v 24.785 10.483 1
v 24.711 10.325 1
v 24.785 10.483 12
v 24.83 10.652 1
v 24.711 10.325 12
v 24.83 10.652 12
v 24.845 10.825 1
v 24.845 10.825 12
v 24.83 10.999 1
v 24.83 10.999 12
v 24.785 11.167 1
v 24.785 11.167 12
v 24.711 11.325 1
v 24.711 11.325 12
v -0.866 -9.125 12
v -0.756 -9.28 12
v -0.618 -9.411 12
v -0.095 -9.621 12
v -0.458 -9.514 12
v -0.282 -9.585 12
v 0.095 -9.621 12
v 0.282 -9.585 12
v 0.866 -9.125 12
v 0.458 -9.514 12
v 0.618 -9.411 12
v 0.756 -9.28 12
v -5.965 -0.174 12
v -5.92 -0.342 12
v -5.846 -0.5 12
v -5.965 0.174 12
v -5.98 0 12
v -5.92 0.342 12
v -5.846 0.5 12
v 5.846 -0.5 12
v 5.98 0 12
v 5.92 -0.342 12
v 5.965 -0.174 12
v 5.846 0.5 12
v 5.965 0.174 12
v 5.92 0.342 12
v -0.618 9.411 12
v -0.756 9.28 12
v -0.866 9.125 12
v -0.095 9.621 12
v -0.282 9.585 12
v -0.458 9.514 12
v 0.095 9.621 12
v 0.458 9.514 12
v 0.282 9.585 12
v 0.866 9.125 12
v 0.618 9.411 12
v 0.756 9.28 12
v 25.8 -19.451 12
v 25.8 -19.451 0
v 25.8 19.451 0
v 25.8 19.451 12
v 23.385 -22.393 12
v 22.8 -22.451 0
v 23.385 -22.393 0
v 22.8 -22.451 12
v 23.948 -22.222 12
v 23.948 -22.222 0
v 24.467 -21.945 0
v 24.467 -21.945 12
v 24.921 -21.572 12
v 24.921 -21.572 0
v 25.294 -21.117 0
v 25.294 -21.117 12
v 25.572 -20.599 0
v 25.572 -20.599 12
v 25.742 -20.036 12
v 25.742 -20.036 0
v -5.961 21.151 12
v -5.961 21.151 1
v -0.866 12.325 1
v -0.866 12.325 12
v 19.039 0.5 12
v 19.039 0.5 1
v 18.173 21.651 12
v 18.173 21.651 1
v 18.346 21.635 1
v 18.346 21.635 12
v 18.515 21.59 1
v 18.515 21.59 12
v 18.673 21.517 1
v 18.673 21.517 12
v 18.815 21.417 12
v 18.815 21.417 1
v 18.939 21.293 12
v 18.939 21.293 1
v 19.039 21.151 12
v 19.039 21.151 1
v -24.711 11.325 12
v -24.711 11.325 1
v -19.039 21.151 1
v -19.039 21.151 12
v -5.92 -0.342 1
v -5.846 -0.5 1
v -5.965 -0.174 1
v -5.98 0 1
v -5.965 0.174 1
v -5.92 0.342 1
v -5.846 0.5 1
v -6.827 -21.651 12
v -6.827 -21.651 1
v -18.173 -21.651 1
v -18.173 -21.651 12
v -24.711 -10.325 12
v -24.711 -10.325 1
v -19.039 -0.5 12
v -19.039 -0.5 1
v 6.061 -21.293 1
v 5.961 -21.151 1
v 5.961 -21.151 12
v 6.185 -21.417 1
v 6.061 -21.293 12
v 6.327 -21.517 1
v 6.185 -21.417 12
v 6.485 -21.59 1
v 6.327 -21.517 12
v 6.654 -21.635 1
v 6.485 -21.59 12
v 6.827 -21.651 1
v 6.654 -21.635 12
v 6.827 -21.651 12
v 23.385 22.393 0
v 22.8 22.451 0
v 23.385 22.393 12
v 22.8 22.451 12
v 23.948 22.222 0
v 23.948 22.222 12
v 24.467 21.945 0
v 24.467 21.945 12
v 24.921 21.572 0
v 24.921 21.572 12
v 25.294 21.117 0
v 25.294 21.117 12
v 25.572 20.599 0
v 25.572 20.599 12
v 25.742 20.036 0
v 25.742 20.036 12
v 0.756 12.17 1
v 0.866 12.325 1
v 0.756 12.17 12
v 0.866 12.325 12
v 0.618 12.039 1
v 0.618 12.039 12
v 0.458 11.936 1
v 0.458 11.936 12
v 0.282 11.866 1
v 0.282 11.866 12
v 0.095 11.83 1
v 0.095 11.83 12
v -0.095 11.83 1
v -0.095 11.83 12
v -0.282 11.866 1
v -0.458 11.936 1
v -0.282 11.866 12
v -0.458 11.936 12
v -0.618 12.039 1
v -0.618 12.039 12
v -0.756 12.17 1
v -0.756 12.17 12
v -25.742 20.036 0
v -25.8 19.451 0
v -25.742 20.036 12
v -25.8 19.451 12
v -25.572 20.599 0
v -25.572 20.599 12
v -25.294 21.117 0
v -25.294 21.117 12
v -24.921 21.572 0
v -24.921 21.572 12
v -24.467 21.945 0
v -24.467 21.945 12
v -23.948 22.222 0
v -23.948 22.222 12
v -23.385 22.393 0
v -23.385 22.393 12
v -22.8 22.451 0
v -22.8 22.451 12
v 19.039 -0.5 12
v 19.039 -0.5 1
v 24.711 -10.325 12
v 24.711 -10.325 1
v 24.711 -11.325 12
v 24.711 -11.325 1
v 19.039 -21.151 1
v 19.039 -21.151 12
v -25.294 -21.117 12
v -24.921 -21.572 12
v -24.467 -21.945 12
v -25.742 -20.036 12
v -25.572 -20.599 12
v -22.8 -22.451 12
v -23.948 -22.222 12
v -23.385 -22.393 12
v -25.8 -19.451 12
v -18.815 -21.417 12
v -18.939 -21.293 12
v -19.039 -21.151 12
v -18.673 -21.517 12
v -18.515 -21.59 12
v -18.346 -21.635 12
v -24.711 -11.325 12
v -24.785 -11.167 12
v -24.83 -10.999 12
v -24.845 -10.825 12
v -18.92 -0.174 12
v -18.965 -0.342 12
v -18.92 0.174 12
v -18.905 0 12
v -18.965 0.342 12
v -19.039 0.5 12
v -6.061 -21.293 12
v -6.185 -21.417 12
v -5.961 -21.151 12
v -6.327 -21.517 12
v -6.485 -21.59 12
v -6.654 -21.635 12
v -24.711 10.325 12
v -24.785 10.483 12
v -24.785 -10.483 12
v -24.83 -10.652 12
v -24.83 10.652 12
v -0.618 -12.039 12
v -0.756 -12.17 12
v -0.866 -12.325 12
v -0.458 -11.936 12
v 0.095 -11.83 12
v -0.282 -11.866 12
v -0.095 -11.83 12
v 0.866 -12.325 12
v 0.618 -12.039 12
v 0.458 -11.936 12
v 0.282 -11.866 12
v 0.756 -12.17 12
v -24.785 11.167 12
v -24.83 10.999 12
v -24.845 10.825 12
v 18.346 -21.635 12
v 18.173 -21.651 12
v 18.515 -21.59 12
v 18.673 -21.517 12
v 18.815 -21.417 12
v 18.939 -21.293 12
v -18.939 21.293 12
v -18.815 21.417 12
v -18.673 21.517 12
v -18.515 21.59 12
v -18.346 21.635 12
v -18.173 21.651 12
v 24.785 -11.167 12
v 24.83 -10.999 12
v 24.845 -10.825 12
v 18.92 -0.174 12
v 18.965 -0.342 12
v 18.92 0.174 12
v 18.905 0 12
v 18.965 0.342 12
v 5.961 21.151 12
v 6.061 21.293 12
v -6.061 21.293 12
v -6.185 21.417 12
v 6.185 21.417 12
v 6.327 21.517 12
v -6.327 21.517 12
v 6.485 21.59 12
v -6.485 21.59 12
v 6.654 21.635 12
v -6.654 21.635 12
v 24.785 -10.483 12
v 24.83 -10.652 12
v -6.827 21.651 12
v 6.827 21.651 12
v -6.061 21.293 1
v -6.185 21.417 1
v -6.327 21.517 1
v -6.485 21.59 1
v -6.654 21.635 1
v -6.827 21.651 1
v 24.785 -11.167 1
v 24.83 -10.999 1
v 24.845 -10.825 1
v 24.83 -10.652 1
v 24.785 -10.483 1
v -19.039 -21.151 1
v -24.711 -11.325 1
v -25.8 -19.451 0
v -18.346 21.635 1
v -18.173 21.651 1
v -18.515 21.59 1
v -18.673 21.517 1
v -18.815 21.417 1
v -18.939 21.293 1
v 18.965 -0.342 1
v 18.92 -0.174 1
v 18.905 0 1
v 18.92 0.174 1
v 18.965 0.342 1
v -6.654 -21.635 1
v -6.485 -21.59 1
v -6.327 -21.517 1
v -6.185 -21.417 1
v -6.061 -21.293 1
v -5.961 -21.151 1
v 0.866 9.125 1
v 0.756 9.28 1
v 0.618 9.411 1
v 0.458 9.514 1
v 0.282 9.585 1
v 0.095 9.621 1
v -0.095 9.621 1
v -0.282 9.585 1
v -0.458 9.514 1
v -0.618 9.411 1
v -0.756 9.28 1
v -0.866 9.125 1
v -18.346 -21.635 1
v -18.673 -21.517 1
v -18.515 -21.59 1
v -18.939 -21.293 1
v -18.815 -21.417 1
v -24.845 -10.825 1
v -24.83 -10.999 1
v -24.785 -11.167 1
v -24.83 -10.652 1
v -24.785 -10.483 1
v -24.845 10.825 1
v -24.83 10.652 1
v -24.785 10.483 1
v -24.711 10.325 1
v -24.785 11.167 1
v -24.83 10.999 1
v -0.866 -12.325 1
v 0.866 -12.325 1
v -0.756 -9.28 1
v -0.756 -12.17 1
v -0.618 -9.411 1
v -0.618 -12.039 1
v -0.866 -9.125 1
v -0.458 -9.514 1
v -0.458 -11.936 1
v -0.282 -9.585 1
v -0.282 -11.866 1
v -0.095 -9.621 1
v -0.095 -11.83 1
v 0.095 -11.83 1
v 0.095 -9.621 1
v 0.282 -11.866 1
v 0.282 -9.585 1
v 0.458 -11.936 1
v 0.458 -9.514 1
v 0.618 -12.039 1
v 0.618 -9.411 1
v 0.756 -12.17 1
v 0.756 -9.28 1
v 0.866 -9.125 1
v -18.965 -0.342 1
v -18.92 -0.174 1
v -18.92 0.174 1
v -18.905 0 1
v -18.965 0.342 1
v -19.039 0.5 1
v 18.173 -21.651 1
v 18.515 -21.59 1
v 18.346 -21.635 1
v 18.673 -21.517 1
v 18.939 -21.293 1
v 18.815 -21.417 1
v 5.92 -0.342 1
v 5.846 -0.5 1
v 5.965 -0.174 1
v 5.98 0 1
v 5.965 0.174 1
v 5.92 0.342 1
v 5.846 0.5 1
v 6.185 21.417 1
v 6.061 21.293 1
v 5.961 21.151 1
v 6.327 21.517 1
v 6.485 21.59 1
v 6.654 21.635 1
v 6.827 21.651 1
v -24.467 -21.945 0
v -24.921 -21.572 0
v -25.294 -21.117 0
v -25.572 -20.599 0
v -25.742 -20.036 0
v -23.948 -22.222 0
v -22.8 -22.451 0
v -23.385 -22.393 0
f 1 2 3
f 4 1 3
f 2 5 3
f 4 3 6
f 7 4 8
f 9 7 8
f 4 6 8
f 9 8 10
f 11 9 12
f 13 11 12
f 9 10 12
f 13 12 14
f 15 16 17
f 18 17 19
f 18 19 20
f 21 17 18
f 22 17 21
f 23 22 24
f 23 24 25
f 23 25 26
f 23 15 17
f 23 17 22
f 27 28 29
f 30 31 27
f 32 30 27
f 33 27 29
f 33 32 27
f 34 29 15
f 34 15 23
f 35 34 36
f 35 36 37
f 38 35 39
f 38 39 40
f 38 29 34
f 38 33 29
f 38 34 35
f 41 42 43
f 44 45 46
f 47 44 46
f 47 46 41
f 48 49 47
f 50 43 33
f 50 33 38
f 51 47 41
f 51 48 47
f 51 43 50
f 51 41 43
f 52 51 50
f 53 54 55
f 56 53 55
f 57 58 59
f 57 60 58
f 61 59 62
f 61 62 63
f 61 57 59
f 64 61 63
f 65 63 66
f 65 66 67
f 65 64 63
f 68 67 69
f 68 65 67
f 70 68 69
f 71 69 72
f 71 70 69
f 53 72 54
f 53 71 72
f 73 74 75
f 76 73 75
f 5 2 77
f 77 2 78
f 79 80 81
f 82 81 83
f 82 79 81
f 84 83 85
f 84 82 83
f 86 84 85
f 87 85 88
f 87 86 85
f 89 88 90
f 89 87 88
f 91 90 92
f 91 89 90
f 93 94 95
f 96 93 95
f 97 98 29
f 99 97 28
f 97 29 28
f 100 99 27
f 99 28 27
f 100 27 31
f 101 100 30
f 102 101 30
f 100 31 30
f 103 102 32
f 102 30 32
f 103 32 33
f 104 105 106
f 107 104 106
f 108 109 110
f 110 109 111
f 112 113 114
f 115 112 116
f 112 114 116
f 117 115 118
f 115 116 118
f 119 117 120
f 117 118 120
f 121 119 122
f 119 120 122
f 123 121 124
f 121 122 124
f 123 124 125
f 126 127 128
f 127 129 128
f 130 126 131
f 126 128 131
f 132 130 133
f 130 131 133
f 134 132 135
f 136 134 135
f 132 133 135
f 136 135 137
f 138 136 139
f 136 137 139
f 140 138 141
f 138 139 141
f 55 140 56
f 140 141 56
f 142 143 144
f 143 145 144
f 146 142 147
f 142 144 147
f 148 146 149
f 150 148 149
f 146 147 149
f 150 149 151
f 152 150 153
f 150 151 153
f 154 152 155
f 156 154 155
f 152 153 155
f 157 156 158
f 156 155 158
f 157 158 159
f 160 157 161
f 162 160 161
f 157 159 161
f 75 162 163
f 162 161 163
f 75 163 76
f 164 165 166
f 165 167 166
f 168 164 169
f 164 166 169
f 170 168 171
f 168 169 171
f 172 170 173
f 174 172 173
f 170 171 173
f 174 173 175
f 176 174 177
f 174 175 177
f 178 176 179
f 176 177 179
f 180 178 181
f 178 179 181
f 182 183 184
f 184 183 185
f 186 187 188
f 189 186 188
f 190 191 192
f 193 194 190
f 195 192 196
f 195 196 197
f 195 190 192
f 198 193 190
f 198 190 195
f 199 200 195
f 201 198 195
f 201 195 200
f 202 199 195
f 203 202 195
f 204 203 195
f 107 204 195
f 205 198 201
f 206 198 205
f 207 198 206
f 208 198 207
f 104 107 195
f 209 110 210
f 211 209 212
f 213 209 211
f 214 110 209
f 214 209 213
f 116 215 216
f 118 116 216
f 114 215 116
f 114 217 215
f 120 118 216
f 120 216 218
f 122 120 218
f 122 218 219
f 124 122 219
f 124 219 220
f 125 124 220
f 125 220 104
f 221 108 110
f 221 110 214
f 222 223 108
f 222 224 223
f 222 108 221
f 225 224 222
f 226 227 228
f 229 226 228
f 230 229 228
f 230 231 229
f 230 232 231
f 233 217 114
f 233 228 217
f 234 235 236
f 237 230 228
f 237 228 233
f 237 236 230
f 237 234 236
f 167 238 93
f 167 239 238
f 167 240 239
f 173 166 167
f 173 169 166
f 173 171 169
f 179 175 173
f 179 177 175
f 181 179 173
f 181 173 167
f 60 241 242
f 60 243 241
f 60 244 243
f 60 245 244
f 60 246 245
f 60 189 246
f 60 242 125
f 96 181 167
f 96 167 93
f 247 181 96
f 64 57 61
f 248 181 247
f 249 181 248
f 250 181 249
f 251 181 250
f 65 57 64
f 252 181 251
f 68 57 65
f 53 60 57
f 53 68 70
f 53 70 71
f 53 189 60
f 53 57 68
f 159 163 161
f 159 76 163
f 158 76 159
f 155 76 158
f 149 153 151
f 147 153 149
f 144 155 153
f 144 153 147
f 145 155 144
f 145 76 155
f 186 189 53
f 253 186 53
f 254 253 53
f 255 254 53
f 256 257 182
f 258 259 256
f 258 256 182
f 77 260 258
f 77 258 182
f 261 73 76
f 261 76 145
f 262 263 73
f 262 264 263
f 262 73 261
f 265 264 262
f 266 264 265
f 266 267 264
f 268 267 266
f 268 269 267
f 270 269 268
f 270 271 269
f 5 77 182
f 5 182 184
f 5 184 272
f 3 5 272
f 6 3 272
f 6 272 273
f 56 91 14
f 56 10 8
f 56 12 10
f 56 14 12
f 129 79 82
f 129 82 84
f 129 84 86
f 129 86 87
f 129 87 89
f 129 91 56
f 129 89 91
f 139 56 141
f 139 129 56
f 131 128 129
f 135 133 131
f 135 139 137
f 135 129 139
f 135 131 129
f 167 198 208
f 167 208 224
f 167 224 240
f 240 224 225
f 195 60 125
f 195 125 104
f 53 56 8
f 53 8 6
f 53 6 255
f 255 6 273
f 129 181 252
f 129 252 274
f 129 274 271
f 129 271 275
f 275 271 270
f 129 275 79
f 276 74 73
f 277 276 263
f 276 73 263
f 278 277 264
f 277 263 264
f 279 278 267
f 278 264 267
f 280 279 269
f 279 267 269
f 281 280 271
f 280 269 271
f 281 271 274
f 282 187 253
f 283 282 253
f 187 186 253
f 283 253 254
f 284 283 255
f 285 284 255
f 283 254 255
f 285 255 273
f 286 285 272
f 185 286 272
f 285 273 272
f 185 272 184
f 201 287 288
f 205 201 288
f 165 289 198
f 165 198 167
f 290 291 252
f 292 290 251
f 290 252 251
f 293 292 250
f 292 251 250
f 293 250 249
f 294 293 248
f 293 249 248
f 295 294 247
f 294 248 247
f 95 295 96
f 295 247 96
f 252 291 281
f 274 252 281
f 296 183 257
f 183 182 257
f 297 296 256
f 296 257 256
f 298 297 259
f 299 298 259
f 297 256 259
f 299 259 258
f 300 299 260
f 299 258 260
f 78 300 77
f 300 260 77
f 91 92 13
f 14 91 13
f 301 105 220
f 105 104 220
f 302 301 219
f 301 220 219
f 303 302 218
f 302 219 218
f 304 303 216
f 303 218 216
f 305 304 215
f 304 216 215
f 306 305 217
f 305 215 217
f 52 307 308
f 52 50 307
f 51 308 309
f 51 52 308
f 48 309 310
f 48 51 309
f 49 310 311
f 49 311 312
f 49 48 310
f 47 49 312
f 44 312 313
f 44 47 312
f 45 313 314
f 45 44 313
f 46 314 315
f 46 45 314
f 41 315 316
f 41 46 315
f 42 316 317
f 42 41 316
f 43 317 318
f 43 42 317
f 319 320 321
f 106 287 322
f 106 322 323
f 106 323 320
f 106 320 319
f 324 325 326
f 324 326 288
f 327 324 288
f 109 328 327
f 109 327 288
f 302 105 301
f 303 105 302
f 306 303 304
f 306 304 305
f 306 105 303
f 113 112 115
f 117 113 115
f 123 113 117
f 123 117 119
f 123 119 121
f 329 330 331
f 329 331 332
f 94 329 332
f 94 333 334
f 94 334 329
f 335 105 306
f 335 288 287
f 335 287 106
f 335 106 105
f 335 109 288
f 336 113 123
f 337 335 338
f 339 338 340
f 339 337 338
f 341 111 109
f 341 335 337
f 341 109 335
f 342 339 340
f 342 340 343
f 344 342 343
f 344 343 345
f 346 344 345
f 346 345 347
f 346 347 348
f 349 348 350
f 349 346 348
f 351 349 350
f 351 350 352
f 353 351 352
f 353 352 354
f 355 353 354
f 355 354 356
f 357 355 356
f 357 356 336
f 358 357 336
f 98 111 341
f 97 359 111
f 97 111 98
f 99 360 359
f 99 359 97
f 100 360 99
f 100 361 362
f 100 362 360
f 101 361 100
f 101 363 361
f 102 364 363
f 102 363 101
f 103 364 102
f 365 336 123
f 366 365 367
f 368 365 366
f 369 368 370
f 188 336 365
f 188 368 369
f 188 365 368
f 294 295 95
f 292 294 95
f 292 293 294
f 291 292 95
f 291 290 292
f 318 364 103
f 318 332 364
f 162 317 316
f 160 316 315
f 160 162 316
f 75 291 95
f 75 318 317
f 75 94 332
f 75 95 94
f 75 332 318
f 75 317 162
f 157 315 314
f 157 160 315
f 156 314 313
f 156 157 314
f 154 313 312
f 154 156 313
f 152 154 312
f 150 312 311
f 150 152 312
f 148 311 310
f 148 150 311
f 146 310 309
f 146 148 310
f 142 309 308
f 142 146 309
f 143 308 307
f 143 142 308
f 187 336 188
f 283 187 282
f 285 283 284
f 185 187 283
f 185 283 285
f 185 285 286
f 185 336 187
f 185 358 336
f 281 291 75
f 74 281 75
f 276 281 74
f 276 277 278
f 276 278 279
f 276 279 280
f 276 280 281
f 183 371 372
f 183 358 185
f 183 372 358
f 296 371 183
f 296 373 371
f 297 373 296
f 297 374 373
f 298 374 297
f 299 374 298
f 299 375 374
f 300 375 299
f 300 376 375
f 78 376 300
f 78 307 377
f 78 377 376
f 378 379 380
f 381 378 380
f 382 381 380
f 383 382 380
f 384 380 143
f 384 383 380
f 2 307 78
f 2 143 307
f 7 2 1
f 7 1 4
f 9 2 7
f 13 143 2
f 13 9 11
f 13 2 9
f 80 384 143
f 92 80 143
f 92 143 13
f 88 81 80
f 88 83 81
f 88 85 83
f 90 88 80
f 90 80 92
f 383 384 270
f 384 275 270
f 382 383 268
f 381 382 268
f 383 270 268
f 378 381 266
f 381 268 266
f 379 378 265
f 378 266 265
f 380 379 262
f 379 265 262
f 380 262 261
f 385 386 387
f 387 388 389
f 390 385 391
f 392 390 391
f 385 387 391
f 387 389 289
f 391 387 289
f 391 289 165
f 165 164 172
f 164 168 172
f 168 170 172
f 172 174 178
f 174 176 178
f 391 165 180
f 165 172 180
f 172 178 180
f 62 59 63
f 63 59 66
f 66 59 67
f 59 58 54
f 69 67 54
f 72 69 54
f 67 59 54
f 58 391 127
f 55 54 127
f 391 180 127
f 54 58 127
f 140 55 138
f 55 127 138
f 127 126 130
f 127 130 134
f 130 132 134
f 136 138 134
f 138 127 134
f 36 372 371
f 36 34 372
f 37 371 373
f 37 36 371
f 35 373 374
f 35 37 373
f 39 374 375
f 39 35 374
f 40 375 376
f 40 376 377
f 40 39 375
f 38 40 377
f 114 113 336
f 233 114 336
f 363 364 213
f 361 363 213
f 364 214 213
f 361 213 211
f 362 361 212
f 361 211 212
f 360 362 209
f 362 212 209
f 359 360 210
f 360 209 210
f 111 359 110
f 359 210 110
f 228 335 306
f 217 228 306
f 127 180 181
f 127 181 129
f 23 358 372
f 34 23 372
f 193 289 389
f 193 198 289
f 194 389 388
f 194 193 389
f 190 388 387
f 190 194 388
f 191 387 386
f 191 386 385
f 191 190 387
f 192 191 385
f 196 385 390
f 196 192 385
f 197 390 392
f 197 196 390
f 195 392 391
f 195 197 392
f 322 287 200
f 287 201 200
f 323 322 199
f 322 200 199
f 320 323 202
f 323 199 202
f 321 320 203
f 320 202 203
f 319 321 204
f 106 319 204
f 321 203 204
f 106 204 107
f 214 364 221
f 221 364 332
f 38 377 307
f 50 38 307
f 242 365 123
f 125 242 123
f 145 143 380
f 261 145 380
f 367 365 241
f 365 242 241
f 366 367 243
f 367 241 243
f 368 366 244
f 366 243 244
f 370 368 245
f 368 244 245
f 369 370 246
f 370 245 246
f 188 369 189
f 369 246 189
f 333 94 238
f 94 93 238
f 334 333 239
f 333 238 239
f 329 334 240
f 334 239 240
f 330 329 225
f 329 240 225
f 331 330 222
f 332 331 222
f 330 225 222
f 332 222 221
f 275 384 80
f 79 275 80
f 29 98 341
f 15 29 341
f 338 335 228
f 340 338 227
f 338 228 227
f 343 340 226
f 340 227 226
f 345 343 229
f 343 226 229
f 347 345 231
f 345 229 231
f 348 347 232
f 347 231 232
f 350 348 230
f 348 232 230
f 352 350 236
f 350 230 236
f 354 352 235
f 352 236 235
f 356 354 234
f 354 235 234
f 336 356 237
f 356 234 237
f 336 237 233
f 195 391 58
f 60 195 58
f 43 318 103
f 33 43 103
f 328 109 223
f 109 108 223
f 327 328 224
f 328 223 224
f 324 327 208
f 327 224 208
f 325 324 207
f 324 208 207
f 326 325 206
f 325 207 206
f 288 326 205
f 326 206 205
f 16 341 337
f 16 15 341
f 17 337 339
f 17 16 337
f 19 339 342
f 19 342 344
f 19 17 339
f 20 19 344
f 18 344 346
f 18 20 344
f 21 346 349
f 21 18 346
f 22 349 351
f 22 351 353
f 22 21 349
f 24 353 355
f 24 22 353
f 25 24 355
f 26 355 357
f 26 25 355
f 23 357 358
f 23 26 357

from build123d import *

# Parameters (mm, degrees)
F1_DEPTH = 1
F0_W     = 51.6
F0_H     = 44.90127
F2_DEPTH = 12
F3_R     = 3
F4_R     = 1


with BuildPart() as f1:
    # F0 (on Top) → F1 (new body)
    with BuildSketch(Plane.XY):
        Polygon((18.75, 0), (25, 10.825318), (18.75, 21.650635), (6.25, 21.650635), (0, 10.825318), (-6.25, 21.650635), (-18.75, 21.650635), (-25, 10.825318), (-18.75, 0), (-25, -10.825318), (-18.75, -21.650635), (-6.25, -21.650635), (0, -10.825318), (6.25, -21.650635), (18.75, -21.650635), (25, -10.825318), align=None)
        Polygon((-6.13453, 0), (0, 10.625318), (6.13453, 0), (0, -10.625318), align=None, mode=Mode.SUBTRACT)
    extrude(amount=F1_DEPTH)

    # F0 (on Top) → F2 (join)
    with BuildSketch(Plane.XY):
        Rectangle(F0_W, F0_H)
        Polygon((18.75, 21.650635), (25, 10.825318), (18.75, 0), (25, -10.825318), (18.75, -21.650635), (6.25, -21.650635), (0, -10.825318), (-6.25, -21.650635), (-18.75, -21.650635), (-25, -10.825318), (-18.75, 0), (-25, 10.825318), (-18.75, 21.650635), (-6.25, 21.650635), (0, 10.825318), (6.25, 21.650635), align=None, mode=Mode.SUBTRACT)
        Polygon((6.13453, 0), (0, 10.625318), (-6.13453, 0), (0, -10.625318), align=None)
    extrude(amount=F2_DEPTH)

    # F3
    f3_edges = [f1.edges().sort_by_distance(p)[0] for p in [
        (25.8, -22.450635, 6),
        (25.8, 22.450635, 6),
        (-25.8, -22.450635, 6),
        (-25.8, 22.450635, 6),
    ]]
    fillet(f3_edges, radius=F3_R)

    # F4
    f4_edges = [f1.edges().sort_by_distance(p)[0] for p in [
        (0, -10.825318, 6.5),
        (0, -10.625318, 6.5),
        (6.13453, 0, 6.5),
        (0, 10.825318, 6.5),
        (0, 10.625318, 6.5),
        (-25, 10.825318, 6.5),
        (-18.75, 0, 6.5),
        (-25, -10.825318, 6.5),
        (-6.13453, 0, 6.5),
        (-18.75, -21.650635, 6.5),
        (-6.25, -21.650635, 6.5),
        (-6.25, 21.650635, 6.5),
        (-18.75, 21.650635, 6.5),
        (6.25, -21.650635, 6.5),
        (18.75, -21.650635, 6.5),
        (18.75, 0, 6.5),
        (6.25, 21.650635, 6.5),
        (18.75, 21.650635, 6.5),
        (25, 10.825318, 6.5),
        (25, -10.825318, 6.5),
    ]]
    fillet(f4_edges, radius=F4_R)


solid = f1.part
